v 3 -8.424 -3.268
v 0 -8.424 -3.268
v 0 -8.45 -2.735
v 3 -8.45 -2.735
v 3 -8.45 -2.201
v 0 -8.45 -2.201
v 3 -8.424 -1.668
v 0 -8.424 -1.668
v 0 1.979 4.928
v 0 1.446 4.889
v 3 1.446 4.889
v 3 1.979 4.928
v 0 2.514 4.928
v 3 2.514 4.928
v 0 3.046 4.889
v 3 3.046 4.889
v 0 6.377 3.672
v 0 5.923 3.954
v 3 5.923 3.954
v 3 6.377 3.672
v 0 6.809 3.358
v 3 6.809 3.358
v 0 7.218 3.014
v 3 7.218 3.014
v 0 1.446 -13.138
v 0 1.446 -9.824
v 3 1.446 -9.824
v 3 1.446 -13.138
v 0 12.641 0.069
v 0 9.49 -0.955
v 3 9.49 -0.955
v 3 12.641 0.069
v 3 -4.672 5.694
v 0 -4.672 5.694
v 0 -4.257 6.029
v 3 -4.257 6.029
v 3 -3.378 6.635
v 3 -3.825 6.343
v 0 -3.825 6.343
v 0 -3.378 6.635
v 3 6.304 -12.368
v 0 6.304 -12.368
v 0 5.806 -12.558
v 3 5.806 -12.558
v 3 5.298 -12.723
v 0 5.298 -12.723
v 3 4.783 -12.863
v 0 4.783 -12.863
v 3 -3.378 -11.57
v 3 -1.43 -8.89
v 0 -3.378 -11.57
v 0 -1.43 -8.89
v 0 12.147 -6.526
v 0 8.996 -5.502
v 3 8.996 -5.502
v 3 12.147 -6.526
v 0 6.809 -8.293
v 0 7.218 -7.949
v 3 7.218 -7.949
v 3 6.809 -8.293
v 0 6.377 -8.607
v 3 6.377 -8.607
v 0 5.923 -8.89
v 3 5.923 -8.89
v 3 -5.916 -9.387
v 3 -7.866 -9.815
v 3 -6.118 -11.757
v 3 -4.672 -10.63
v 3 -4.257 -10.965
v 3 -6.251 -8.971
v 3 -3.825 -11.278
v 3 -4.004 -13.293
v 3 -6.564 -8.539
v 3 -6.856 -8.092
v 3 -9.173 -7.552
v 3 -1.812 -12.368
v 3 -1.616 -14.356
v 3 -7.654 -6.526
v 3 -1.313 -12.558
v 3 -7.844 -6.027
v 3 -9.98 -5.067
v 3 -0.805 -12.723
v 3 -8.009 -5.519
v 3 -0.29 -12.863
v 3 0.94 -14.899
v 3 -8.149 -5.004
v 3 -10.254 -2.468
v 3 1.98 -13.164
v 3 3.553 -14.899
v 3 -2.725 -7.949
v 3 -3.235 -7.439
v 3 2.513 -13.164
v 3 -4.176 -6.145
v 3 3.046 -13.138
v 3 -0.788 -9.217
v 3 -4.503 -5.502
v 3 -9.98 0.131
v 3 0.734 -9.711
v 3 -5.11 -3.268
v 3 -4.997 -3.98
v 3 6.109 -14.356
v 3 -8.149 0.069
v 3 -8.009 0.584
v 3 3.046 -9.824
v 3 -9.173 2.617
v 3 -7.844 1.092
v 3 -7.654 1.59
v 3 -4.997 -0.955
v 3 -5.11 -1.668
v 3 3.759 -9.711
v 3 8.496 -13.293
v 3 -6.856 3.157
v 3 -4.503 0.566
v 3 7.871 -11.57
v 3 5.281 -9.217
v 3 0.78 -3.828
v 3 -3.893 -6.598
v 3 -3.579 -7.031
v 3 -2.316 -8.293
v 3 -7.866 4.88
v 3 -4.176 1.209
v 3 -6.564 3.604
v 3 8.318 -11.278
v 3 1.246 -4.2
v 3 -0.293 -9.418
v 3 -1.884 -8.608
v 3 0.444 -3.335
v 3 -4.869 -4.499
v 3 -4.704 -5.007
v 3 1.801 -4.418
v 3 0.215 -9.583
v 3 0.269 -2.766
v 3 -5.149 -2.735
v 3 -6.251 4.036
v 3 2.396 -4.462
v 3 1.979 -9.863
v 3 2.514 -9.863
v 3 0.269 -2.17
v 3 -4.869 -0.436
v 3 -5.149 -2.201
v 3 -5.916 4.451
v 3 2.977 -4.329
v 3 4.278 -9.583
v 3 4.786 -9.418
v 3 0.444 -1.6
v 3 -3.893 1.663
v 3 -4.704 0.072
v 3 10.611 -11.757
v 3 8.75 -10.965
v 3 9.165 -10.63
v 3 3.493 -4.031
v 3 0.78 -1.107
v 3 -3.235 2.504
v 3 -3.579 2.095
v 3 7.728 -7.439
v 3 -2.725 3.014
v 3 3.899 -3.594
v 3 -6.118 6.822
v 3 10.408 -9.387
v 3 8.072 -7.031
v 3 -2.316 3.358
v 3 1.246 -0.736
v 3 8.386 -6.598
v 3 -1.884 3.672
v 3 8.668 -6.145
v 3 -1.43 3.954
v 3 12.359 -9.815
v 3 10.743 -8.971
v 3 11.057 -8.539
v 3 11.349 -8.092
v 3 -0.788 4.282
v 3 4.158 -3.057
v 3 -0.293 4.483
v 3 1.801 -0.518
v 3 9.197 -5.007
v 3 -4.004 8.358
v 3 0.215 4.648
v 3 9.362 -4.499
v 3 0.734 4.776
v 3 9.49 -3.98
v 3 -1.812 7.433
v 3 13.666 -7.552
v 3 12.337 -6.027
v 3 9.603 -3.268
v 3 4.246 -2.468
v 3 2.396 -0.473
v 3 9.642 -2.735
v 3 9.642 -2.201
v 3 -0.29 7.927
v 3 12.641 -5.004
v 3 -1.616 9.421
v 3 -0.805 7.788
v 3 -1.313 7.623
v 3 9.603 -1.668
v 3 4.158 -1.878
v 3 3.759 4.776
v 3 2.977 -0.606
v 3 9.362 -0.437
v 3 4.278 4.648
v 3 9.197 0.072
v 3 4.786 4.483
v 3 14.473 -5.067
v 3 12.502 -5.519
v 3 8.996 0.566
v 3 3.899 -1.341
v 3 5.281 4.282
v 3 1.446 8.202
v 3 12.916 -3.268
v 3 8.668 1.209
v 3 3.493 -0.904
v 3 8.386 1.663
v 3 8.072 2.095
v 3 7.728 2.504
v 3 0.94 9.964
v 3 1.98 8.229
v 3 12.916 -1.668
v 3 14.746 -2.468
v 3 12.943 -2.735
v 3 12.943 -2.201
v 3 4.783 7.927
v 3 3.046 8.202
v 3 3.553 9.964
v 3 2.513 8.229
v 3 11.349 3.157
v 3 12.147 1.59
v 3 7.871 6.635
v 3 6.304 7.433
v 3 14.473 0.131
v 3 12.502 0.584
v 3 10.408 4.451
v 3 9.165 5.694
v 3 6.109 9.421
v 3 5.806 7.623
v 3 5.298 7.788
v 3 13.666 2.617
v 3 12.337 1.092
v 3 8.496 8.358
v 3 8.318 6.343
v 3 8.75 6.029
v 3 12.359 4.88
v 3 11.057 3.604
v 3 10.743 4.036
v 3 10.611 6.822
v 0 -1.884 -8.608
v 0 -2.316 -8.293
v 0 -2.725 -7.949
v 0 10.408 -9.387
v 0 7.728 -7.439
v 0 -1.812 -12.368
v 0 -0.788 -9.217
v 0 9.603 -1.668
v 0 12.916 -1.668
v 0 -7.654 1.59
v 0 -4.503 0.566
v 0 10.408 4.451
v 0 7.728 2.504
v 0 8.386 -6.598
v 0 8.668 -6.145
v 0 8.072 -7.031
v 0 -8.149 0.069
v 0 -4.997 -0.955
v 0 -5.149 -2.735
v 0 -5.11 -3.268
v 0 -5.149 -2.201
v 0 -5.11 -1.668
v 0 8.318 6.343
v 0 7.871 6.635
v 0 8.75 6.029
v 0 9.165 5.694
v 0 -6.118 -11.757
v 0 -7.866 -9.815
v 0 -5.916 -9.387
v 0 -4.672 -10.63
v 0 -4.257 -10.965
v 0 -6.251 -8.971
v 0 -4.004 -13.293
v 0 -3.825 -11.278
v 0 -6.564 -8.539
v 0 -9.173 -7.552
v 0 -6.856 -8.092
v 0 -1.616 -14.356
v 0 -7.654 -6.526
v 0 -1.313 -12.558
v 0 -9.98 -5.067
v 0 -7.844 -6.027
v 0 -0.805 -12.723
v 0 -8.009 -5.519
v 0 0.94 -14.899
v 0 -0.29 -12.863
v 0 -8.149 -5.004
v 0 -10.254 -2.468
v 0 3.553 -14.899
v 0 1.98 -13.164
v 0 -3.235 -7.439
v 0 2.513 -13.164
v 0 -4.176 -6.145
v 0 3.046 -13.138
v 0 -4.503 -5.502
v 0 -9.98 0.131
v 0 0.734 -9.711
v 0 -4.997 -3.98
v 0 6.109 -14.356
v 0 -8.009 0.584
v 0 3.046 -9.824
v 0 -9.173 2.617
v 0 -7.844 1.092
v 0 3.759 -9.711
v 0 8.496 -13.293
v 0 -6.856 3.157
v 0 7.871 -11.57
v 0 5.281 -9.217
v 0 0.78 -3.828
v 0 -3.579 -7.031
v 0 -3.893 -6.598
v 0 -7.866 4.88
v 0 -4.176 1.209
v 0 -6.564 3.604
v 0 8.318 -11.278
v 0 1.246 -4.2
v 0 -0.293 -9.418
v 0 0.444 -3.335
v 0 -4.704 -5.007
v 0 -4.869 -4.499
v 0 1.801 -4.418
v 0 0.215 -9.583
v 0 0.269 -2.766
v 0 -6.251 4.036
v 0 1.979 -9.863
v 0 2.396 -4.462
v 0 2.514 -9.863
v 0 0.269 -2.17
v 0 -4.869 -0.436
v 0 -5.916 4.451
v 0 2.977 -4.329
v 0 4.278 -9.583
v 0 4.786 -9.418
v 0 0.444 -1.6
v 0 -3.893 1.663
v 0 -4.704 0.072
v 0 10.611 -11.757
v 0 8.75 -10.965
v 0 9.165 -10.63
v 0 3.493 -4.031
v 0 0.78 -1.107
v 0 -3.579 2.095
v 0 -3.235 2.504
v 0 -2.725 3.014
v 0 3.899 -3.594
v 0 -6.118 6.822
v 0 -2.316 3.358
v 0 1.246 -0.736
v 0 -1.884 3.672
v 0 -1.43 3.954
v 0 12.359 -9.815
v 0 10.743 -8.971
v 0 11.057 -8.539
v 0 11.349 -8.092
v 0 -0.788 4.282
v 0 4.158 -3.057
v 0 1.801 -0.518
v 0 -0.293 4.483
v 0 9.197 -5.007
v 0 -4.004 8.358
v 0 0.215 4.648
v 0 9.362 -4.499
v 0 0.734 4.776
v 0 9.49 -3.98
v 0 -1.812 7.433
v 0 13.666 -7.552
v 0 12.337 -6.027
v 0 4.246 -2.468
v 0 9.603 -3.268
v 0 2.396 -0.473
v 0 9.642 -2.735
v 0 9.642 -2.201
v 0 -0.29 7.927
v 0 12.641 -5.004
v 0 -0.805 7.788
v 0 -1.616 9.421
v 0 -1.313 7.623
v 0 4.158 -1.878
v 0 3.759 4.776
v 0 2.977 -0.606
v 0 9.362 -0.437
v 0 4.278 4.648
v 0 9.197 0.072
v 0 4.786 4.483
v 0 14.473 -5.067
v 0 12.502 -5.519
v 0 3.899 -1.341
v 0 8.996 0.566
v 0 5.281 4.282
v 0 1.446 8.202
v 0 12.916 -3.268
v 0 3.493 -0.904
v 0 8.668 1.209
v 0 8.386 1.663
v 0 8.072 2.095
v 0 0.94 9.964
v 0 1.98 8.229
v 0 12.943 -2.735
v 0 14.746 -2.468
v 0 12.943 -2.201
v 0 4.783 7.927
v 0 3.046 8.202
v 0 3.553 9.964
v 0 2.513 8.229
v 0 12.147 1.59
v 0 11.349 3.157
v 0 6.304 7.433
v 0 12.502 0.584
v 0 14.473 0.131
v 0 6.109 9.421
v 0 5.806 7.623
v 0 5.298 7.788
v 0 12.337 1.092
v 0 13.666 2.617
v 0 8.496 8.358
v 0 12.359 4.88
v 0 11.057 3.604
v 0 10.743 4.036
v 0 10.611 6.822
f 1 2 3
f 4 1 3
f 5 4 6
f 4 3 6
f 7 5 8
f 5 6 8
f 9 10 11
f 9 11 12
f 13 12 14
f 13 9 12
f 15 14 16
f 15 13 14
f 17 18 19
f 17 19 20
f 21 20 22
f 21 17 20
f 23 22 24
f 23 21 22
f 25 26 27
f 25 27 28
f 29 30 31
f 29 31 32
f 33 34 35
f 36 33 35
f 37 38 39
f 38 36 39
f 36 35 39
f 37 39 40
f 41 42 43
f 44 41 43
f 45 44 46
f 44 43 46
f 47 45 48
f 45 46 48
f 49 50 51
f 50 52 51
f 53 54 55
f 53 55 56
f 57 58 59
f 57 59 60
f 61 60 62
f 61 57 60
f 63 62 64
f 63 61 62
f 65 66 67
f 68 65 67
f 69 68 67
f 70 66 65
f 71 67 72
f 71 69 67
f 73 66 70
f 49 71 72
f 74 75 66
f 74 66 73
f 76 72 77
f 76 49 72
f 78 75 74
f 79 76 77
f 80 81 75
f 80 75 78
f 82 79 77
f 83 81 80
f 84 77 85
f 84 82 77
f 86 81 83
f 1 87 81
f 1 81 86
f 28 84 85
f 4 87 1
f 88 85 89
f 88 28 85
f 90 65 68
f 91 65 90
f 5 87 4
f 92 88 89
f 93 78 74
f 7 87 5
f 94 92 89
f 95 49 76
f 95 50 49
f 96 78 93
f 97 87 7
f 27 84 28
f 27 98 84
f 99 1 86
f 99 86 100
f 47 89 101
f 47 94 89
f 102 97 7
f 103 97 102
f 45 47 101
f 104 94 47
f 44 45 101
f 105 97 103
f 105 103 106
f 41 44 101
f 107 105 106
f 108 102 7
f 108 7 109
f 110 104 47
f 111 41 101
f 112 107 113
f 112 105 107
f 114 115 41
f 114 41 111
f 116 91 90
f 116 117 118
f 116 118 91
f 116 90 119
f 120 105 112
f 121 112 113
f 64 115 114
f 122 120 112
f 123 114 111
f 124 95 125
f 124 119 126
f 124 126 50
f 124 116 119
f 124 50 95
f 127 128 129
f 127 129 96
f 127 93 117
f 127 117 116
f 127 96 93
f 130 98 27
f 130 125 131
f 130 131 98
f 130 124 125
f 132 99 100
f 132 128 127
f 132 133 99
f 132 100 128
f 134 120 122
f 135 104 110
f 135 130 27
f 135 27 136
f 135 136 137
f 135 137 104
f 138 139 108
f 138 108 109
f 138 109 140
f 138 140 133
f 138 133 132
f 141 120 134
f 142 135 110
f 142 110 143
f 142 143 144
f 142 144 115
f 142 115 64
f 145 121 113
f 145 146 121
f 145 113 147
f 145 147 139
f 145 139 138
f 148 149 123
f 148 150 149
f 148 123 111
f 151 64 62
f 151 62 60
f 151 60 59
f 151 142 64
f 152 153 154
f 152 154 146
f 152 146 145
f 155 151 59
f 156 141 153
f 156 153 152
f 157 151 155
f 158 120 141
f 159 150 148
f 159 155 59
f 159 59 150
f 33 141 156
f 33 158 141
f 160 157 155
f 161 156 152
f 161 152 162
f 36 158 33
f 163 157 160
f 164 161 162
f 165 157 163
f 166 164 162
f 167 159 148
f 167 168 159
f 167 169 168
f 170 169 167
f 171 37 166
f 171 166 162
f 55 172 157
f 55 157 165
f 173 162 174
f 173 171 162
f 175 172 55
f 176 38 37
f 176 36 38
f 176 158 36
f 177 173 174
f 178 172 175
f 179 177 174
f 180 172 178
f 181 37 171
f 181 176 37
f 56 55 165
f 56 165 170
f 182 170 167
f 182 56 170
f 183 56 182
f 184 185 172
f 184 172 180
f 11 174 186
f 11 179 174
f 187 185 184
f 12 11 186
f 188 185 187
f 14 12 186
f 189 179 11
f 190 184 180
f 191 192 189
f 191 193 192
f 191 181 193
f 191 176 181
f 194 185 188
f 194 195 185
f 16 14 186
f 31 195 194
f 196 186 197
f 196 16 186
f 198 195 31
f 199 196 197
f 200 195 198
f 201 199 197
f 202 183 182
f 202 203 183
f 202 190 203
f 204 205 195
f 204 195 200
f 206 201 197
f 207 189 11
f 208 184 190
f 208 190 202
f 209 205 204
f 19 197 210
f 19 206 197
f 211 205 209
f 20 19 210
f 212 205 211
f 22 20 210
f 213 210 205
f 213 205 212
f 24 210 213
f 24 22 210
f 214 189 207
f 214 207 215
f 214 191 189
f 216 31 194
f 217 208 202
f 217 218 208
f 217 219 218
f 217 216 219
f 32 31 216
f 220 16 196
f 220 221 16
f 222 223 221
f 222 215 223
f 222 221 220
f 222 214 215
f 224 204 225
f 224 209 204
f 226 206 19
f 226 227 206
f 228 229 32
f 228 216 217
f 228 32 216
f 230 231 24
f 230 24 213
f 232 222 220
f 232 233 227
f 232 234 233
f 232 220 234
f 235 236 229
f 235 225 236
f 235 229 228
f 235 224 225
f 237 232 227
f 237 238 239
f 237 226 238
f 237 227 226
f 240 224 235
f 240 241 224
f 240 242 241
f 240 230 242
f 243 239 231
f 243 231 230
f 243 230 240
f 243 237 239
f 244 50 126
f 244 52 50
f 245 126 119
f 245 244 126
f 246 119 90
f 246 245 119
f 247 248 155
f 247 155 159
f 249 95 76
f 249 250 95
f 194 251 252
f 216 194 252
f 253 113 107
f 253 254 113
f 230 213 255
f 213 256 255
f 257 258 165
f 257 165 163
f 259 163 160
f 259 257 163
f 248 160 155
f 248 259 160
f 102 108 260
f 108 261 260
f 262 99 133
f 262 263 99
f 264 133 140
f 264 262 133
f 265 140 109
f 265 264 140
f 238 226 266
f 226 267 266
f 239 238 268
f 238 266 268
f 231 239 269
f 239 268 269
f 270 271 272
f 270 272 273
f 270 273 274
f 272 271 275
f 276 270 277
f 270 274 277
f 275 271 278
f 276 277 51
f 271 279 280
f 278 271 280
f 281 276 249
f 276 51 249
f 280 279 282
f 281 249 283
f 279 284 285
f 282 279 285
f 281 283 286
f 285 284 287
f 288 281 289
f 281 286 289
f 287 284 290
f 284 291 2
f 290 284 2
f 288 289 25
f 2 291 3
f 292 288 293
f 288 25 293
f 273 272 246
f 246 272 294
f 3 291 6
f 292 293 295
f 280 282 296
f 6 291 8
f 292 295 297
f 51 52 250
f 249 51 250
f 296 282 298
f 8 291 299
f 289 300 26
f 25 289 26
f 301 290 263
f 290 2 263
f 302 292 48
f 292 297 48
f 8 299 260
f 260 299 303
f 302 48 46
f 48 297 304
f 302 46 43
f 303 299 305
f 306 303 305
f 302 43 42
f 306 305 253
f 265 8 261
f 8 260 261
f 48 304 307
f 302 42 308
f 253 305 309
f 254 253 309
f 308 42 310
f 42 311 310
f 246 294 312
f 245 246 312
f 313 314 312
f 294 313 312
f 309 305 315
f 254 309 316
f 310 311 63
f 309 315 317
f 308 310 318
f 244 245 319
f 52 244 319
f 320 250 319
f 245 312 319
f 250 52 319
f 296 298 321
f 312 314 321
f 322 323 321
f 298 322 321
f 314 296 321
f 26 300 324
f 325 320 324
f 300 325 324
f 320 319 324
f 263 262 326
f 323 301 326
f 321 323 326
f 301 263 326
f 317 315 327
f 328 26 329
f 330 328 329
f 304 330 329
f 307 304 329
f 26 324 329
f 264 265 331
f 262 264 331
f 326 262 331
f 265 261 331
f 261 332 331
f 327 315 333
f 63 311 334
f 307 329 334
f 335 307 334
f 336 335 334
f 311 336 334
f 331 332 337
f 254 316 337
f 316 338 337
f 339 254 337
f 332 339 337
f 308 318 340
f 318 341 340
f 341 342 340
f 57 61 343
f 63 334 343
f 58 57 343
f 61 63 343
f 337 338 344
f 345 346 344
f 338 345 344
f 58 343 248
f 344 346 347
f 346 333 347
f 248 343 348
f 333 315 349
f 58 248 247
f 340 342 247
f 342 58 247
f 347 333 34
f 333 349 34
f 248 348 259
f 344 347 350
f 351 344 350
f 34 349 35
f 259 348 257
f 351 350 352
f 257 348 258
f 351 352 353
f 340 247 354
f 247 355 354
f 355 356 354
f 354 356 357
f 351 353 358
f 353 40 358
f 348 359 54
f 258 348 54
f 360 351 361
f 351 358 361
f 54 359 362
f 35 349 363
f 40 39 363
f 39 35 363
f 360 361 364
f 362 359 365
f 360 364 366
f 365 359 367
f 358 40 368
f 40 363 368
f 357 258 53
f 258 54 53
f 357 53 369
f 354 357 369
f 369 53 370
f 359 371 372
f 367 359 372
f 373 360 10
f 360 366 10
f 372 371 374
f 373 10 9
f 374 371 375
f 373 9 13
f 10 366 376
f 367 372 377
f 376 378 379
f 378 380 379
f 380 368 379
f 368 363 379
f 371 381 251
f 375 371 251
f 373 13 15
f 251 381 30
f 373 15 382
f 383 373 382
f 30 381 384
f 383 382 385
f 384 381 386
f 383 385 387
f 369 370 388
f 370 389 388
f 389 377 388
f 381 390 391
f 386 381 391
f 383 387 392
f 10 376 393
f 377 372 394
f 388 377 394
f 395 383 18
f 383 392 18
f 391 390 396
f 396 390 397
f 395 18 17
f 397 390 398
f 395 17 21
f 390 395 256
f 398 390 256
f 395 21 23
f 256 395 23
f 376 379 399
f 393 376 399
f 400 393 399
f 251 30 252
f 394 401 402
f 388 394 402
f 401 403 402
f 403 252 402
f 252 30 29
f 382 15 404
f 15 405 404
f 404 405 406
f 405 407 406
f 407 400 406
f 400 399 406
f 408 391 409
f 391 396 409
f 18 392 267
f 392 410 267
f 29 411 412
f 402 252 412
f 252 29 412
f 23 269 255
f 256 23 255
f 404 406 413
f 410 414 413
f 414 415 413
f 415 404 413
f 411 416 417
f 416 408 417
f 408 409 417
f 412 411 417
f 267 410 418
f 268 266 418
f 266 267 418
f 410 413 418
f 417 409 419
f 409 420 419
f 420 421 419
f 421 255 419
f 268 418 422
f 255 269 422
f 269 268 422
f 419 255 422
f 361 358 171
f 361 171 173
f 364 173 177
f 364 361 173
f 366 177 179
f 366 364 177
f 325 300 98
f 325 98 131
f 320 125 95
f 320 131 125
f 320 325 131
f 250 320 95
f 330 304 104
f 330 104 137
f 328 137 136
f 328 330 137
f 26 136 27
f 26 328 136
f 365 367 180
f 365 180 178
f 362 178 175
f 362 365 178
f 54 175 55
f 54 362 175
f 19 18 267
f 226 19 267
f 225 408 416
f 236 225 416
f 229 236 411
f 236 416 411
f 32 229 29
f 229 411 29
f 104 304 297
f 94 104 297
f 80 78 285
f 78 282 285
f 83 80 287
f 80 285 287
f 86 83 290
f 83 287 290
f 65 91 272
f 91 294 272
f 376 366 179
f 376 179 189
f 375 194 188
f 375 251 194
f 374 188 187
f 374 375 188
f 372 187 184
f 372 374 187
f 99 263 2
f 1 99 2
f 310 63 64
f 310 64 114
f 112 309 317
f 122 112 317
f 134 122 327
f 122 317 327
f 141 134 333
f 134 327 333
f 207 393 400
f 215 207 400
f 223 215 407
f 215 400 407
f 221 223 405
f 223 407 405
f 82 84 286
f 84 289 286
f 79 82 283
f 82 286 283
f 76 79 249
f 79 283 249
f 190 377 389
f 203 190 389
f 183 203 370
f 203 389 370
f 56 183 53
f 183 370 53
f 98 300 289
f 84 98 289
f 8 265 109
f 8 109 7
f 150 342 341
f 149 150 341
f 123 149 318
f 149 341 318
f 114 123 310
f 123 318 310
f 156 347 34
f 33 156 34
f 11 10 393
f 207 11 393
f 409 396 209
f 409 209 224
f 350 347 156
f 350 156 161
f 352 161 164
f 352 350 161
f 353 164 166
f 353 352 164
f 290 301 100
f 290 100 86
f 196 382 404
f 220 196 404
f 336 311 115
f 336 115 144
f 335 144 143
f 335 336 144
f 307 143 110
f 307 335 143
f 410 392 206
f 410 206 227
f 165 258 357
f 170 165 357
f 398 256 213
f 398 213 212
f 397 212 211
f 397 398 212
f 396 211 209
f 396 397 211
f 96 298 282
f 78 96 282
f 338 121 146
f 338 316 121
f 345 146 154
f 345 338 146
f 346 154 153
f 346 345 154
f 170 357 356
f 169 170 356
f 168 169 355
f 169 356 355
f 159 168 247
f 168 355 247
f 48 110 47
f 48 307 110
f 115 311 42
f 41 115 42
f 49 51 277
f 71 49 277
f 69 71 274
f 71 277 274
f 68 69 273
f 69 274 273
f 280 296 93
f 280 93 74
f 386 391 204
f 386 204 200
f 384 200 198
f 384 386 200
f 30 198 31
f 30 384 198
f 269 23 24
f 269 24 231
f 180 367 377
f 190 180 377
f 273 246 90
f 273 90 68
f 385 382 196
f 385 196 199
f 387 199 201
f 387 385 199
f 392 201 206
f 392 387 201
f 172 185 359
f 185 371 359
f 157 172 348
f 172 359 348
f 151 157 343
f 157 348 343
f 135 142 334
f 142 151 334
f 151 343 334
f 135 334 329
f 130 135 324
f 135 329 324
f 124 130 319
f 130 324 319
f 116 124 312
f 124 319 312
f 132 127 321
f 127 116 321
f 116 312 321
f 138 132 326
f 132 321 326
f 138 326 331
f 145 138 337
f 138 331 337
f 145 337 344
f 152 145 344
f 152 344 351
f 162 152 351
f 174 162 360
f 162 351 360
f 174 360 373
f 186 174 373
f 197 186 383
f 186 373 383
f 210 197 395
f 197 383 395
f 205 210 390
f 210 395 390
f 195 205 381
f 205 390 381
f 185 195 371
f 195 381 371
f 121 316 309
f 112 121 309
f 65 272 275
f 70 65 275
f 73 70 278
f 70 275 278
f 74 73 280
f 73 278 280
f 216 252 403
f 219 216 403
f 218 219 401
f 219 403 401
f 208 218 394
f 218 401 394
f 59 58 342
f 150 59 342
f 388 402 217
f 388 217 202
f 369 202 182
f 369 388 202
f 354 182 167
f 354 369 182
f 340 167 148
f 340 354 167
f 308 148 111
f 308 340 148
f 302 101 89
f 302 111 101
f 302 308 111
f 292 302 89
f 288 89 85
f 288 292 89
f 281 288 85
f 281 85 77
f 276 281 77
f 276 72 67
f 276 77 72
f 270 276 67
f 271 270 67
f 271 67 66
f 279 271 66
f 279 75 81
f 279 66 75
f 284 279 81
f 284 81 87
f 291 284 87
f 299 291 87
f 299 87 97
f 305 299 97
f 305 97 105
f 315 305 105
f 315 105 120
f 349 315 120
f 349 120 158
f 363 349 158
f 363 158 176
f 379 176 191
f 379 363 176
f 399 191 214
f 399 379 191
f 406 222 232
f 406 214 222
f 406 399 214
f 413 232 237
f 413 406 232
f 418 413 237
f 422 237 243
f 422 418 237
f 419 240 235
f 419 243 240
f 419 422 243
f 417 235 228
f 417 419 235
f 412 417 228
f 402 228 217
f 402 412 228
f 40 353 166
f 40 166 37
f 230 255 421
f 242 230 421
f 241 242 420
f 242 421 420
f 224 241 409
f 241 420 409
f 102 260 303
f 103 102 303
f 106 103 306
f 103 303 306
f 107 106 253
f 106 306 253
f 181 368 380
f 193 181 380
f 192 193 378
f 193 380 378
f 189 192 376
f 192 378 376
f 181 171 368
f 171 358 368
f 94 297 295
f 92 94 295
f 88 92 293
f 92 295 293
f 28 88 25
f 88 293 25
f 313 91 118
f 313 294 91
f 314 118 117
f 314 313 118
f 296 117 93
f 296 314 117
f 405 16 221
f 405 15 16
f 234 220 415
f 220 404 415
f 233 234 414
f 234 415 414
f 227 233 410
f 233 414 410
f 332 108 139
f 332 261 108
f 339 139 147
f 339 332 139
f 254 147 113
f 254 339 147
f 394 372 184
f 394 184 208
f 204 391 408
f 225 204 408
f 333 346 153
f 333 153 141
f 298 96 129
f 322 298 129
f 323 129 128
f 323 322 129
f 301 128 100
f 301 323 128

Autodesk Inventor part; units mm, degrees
ref_plane "YZ Plane" through (0, 0, 0) normal (1, 0, 0) x (0, 1, 0)
ref_plane "XZ Plane" through (0, 0, 0) normal (0, 1, 0) x (-1, 0, 0)
ref_plane "XY Plane" through (0, 0, 0) normal (0, 0, 1) x (1, 0, 0)
sketch "Sketch1" plane through (0, 0, 0) normal (1, 0, 0) x (0, 1, 0)
  circle A0 centre (2.2464, -2.4677) radius 12.5
  circle A1 centre (2.2464, -2.4677) radius 2
  arc A2 (9.603, -3.2677) -> (9.603, -1.6677) centre (2.2464, -2.4677) ccw
  arc A3 (12.9165, -3.2677) -> (12.9165, -1.6677) centre (2.2464, -2.4677) ccw
  line L0 (9.603, -3.2677) -> (12.9165, -3.2677)
  line L1 (9.603, -1.6677) -> (12.9165, -1.6677)
  line L2 (8.9958, 0.5665) -> (12.147, 1.5904)
  arc A4 (12.6414, 0.0687) -> (12.147, 1.5904) centre (2.2464, -2.4677) ccw
  line L3 (9.4902, -0.9552) -> (12.6414, 0.0687)
  arc A5 (9.4902, -0.9552) -> (8.9958, 0.5665) centre (2.2464, -2.4677) ccw
  line L4 (7.7278, 2.5037) -> (10.4084, 4.4513)
  arc A6 (11.3489, 3.1568) -> (10.4084, 4.4513) centre (2.2464, -2.4677) ccw
  line L5 (8.6683, 1.2092) -> (11.3489, 3.1568)
  arc A7 (8.6683, 1.2092) -> (7.7278, 2.5037) centre (2.2464, -2.4677) ccw
  line L6 (5.9233, 3.9542) -> (7.8709, 6.6348)
  arc A8 (9.1653, 5.6944) -> (7.8709, 6.6348) centre (2.2464, -2.4677) ccw
  line L7 (7.2177, 3.0138) -> (9.1653, 5.6944)
  arc A9 (7.2177, 3.0138) -> (5.9233, 3.9542) centre (2.2464, -2.4677) ccw
  line L8 (3.7589, 4.7761) -> (4.7828, 7.9274)
  arc A10 (6.3045, 7.433) -> (4.7828, 7.9274) centre (2.2464, -2.4677) ccw
  line L9 (5.2806, 4.2817) -> (6.3045, 7.433)
  arc A11 (5.2806, 4.2817) -> (3.7589, 4.7761) centre (2.2464, -2.4677) ccw
  line L10 (1.4464, 4.889) -> (1.4464, 8.2024)
  arc A12 (3.0464, 8.2024) -> (1.4464, 8.2024) centre (2.2464, -2.4677) ccw
  line L11 (3.0464, 4.889) -> (3.0464, 8.2024)
  arc A13 (3.0464, 4.889) -> (1.4464, 4.889) centre (2.2464, -2.4677) ccw
  line L12 (-0.7878, 4.2817) -> (-1.8117, 7.433)
  arc A14 (-0.29, 7.9274) -> (-1.8117, 7.433) centre (2.2464, -2.4677) ccw
  line L13 (0.7339, 4.7761) -> (-0.29, 7.9274)
  arc A15 (0.7339, 4.7761) -> (-0.7878, 4.2817) centre (2.2464, -2.4677) ccw
  line L14 (-2.7249, 3.0138) -> (-4.6725, 5.6944)
  arc A16 (-3.3781, 6.6348) -> (-4.6725, 5.6944) centre (2.2464, -2.4677) ccw
  line L15 (-1.4305, 3.9542) -> (-3.3781, 6.6348)
  arc A17 (-1.4305, 3.9542) -> (-2.7249, 3.0138) centre (2.2464, -2.4677) ccw
  line L16 (-4.1755, 1.2092) -> (-6.8561, 3.1568)
  arc A18 (-5.9156, 4.4513) -> (-6.8561, 3.1568) centre (2.2464, -2.4677) ccw
  line L17 (-3.235, 2.5037) -> (-5.9156, 4.4513)
  arc A19 (-3.235, 2.5037) -> (-4.1755, 1.2092) centre (2.2464, -2.4677) ccw
  line L18 (-4.9974, -0.9552) -> (-8.1486, 0.0687)
  arc A20 (-7.6542, 1.5904) -> (-8.1486, 0.0687) centre (2.2464, -2.4677) ccw
  line L19 (-4.503, 0.5665) -> (-7.6542, 1.5904)
  arc A21 (-4.503, 0.5665) -> (-4.9974, -0.9552) centre (2.2464, -2.4677) ccw
  line L20 (-5.1102, -3.2677) -> (-8.4237, -3.2677)
  arc A22 (-8.4237, -1.6677) -> (-8.4237, -3.2677) centre (2.2464, -2.4677) ccw
  line L21 (-5.1102, -1.6677) -> (-8.4237, -1.6677)
  arc A23 (-5.1102, -1.6677) -> (-5.1102, -3.2677) centre (2.2464, -2.4677) ccw
  line L22 (-4.503, -5.5018) -> (-7.6542, -6.5257)
  arc A24 (-8.1486, -5.004) -> (-7.6542, -6.5257) centre (2.2464, -2.4677) ccw
  line L23 (-4.9974, -3.9801) -> (-8.1486, -5.004)
  arc A25 (-4.9974, -3.9801) -> (-4.503, -5.5018) centre (2.2464, -2.4677) ccw
  line L24 (-3.235, -7.439) -> (-5.9156, -9.3866)
  arc A26 (-6.8561, -8.0921) -> (-5.9156, -9.3866) centre (2.2464, -2.4677) ccw
  line L25 (-4.1755, -6.1446) -> (-6.8561, -8.0921)
  arc A27 (-4.1755, -6.1446) -> (-3.235, -7.439) centre (2.2464, -2.4677) ccw
  line L26 (-1.4305, -8.8895) -> (-3.3781, -11.5701)
  arc A28 (-4.6725, -10.6297) -> (-3.3781, -11.5701) centre (2.2464, -2.4677) ccw
  line L27 (-2.7249, -7.9491) -> (-4.6725, -10.6297)
  arc A29 (-2.7249, -7.9491) -> (-1.4305, -8.8895) centre (2.2464, -2.4677) ccw
  line L28 (0.7339, -9.7114) -> (-0.29, -12.8627)
  arc A30 (-1.8117, -12.3683) -> (-0.29, -12.8627) centre (2.2464, -2.4677) ccw
  line L29 (-0.7878, -9.217) -> (-1.8117, -12.3683)
  arc A31 (-0.7878, -9.217) -> (0.7339, -9.7114) centre (2.2464, -2.4677) ccw
  line L30 (3.0464, -9.8243) -> (3.0464, -13.1377)
  arc A32 (1.4464, -13.1377) -> (3.0464, -13.1377) centre (2.2464, -2.4677) ccw
  line L31 (1.4464, -9.8243) -> (1.4464, -13.1377)
  arc A33 (1.4464, -9.8243) -> (3.0464, -9.8243) centre (2.2464, -2.4677) ccw
  line L32 (5.2806, -9.217) -> (6.3045, -12.3683)
  arc A34 (4.7828, -12.8627) -> (6.3045, -12.3683) centre (2.2464, -2.4677) ccw
  line L33 (3.7589, -9.7114) -> (4.7828, -12.8627)
  arc A35 (3.7589, -9.7114) -> (5.2806, -9.217) centre (2.2464, -2.4677) ccw
  line L34 (7.2177, -7.9491) -> (9.1653, -10.6297)
  arc A36 (7.8709, -11.5701) -> (9.1653, -10.6297) centre (2.2464, -2.4677) ccw
  line L35 (5.9233, -8.8895) -> (7.8709, -11.5701)
  arc A37 (5.9233, -8.8895) -> (7.2177, -7.9491) centre (2.2464, -2.4677) ccw
  line L36 (8.6683, -6.1446) -> (11.3489, -8.0921)
  arc A38 (10.4084, -9.3866) -> (11.3489, -8.0921) centre (2.2464, -2.4677) ccw
  line L37 (7.7278, -7.439) -> (10.4084, -9.3866)
  arc A39 (7.7278, -7.439) -> (8.6683, -6.1446) centre (2.2464, -2.4677) ccw
  line L38 (9.4902, -3.9801) -> (12.6414, -5.004)
  arc A40 (12.147, -6.5257) -> (12.6414, -5.004) centre (2.2464, -2.4677) ccw
  line L39 (8.9958, -5.5018) -> (12.147, -6.5257)
  arc A41 (8.9958, -5.5018) -> (9.4902, -3.9801) centre (2.2464, -2.4677) ccw
  point P0 (0, 0)
  dimension "d7" = 5.4
  dimension "d12" = 360
extrude "Extrusion1" add sketch "Sketch1" along normal blind 3
properties part number "Enc_"
